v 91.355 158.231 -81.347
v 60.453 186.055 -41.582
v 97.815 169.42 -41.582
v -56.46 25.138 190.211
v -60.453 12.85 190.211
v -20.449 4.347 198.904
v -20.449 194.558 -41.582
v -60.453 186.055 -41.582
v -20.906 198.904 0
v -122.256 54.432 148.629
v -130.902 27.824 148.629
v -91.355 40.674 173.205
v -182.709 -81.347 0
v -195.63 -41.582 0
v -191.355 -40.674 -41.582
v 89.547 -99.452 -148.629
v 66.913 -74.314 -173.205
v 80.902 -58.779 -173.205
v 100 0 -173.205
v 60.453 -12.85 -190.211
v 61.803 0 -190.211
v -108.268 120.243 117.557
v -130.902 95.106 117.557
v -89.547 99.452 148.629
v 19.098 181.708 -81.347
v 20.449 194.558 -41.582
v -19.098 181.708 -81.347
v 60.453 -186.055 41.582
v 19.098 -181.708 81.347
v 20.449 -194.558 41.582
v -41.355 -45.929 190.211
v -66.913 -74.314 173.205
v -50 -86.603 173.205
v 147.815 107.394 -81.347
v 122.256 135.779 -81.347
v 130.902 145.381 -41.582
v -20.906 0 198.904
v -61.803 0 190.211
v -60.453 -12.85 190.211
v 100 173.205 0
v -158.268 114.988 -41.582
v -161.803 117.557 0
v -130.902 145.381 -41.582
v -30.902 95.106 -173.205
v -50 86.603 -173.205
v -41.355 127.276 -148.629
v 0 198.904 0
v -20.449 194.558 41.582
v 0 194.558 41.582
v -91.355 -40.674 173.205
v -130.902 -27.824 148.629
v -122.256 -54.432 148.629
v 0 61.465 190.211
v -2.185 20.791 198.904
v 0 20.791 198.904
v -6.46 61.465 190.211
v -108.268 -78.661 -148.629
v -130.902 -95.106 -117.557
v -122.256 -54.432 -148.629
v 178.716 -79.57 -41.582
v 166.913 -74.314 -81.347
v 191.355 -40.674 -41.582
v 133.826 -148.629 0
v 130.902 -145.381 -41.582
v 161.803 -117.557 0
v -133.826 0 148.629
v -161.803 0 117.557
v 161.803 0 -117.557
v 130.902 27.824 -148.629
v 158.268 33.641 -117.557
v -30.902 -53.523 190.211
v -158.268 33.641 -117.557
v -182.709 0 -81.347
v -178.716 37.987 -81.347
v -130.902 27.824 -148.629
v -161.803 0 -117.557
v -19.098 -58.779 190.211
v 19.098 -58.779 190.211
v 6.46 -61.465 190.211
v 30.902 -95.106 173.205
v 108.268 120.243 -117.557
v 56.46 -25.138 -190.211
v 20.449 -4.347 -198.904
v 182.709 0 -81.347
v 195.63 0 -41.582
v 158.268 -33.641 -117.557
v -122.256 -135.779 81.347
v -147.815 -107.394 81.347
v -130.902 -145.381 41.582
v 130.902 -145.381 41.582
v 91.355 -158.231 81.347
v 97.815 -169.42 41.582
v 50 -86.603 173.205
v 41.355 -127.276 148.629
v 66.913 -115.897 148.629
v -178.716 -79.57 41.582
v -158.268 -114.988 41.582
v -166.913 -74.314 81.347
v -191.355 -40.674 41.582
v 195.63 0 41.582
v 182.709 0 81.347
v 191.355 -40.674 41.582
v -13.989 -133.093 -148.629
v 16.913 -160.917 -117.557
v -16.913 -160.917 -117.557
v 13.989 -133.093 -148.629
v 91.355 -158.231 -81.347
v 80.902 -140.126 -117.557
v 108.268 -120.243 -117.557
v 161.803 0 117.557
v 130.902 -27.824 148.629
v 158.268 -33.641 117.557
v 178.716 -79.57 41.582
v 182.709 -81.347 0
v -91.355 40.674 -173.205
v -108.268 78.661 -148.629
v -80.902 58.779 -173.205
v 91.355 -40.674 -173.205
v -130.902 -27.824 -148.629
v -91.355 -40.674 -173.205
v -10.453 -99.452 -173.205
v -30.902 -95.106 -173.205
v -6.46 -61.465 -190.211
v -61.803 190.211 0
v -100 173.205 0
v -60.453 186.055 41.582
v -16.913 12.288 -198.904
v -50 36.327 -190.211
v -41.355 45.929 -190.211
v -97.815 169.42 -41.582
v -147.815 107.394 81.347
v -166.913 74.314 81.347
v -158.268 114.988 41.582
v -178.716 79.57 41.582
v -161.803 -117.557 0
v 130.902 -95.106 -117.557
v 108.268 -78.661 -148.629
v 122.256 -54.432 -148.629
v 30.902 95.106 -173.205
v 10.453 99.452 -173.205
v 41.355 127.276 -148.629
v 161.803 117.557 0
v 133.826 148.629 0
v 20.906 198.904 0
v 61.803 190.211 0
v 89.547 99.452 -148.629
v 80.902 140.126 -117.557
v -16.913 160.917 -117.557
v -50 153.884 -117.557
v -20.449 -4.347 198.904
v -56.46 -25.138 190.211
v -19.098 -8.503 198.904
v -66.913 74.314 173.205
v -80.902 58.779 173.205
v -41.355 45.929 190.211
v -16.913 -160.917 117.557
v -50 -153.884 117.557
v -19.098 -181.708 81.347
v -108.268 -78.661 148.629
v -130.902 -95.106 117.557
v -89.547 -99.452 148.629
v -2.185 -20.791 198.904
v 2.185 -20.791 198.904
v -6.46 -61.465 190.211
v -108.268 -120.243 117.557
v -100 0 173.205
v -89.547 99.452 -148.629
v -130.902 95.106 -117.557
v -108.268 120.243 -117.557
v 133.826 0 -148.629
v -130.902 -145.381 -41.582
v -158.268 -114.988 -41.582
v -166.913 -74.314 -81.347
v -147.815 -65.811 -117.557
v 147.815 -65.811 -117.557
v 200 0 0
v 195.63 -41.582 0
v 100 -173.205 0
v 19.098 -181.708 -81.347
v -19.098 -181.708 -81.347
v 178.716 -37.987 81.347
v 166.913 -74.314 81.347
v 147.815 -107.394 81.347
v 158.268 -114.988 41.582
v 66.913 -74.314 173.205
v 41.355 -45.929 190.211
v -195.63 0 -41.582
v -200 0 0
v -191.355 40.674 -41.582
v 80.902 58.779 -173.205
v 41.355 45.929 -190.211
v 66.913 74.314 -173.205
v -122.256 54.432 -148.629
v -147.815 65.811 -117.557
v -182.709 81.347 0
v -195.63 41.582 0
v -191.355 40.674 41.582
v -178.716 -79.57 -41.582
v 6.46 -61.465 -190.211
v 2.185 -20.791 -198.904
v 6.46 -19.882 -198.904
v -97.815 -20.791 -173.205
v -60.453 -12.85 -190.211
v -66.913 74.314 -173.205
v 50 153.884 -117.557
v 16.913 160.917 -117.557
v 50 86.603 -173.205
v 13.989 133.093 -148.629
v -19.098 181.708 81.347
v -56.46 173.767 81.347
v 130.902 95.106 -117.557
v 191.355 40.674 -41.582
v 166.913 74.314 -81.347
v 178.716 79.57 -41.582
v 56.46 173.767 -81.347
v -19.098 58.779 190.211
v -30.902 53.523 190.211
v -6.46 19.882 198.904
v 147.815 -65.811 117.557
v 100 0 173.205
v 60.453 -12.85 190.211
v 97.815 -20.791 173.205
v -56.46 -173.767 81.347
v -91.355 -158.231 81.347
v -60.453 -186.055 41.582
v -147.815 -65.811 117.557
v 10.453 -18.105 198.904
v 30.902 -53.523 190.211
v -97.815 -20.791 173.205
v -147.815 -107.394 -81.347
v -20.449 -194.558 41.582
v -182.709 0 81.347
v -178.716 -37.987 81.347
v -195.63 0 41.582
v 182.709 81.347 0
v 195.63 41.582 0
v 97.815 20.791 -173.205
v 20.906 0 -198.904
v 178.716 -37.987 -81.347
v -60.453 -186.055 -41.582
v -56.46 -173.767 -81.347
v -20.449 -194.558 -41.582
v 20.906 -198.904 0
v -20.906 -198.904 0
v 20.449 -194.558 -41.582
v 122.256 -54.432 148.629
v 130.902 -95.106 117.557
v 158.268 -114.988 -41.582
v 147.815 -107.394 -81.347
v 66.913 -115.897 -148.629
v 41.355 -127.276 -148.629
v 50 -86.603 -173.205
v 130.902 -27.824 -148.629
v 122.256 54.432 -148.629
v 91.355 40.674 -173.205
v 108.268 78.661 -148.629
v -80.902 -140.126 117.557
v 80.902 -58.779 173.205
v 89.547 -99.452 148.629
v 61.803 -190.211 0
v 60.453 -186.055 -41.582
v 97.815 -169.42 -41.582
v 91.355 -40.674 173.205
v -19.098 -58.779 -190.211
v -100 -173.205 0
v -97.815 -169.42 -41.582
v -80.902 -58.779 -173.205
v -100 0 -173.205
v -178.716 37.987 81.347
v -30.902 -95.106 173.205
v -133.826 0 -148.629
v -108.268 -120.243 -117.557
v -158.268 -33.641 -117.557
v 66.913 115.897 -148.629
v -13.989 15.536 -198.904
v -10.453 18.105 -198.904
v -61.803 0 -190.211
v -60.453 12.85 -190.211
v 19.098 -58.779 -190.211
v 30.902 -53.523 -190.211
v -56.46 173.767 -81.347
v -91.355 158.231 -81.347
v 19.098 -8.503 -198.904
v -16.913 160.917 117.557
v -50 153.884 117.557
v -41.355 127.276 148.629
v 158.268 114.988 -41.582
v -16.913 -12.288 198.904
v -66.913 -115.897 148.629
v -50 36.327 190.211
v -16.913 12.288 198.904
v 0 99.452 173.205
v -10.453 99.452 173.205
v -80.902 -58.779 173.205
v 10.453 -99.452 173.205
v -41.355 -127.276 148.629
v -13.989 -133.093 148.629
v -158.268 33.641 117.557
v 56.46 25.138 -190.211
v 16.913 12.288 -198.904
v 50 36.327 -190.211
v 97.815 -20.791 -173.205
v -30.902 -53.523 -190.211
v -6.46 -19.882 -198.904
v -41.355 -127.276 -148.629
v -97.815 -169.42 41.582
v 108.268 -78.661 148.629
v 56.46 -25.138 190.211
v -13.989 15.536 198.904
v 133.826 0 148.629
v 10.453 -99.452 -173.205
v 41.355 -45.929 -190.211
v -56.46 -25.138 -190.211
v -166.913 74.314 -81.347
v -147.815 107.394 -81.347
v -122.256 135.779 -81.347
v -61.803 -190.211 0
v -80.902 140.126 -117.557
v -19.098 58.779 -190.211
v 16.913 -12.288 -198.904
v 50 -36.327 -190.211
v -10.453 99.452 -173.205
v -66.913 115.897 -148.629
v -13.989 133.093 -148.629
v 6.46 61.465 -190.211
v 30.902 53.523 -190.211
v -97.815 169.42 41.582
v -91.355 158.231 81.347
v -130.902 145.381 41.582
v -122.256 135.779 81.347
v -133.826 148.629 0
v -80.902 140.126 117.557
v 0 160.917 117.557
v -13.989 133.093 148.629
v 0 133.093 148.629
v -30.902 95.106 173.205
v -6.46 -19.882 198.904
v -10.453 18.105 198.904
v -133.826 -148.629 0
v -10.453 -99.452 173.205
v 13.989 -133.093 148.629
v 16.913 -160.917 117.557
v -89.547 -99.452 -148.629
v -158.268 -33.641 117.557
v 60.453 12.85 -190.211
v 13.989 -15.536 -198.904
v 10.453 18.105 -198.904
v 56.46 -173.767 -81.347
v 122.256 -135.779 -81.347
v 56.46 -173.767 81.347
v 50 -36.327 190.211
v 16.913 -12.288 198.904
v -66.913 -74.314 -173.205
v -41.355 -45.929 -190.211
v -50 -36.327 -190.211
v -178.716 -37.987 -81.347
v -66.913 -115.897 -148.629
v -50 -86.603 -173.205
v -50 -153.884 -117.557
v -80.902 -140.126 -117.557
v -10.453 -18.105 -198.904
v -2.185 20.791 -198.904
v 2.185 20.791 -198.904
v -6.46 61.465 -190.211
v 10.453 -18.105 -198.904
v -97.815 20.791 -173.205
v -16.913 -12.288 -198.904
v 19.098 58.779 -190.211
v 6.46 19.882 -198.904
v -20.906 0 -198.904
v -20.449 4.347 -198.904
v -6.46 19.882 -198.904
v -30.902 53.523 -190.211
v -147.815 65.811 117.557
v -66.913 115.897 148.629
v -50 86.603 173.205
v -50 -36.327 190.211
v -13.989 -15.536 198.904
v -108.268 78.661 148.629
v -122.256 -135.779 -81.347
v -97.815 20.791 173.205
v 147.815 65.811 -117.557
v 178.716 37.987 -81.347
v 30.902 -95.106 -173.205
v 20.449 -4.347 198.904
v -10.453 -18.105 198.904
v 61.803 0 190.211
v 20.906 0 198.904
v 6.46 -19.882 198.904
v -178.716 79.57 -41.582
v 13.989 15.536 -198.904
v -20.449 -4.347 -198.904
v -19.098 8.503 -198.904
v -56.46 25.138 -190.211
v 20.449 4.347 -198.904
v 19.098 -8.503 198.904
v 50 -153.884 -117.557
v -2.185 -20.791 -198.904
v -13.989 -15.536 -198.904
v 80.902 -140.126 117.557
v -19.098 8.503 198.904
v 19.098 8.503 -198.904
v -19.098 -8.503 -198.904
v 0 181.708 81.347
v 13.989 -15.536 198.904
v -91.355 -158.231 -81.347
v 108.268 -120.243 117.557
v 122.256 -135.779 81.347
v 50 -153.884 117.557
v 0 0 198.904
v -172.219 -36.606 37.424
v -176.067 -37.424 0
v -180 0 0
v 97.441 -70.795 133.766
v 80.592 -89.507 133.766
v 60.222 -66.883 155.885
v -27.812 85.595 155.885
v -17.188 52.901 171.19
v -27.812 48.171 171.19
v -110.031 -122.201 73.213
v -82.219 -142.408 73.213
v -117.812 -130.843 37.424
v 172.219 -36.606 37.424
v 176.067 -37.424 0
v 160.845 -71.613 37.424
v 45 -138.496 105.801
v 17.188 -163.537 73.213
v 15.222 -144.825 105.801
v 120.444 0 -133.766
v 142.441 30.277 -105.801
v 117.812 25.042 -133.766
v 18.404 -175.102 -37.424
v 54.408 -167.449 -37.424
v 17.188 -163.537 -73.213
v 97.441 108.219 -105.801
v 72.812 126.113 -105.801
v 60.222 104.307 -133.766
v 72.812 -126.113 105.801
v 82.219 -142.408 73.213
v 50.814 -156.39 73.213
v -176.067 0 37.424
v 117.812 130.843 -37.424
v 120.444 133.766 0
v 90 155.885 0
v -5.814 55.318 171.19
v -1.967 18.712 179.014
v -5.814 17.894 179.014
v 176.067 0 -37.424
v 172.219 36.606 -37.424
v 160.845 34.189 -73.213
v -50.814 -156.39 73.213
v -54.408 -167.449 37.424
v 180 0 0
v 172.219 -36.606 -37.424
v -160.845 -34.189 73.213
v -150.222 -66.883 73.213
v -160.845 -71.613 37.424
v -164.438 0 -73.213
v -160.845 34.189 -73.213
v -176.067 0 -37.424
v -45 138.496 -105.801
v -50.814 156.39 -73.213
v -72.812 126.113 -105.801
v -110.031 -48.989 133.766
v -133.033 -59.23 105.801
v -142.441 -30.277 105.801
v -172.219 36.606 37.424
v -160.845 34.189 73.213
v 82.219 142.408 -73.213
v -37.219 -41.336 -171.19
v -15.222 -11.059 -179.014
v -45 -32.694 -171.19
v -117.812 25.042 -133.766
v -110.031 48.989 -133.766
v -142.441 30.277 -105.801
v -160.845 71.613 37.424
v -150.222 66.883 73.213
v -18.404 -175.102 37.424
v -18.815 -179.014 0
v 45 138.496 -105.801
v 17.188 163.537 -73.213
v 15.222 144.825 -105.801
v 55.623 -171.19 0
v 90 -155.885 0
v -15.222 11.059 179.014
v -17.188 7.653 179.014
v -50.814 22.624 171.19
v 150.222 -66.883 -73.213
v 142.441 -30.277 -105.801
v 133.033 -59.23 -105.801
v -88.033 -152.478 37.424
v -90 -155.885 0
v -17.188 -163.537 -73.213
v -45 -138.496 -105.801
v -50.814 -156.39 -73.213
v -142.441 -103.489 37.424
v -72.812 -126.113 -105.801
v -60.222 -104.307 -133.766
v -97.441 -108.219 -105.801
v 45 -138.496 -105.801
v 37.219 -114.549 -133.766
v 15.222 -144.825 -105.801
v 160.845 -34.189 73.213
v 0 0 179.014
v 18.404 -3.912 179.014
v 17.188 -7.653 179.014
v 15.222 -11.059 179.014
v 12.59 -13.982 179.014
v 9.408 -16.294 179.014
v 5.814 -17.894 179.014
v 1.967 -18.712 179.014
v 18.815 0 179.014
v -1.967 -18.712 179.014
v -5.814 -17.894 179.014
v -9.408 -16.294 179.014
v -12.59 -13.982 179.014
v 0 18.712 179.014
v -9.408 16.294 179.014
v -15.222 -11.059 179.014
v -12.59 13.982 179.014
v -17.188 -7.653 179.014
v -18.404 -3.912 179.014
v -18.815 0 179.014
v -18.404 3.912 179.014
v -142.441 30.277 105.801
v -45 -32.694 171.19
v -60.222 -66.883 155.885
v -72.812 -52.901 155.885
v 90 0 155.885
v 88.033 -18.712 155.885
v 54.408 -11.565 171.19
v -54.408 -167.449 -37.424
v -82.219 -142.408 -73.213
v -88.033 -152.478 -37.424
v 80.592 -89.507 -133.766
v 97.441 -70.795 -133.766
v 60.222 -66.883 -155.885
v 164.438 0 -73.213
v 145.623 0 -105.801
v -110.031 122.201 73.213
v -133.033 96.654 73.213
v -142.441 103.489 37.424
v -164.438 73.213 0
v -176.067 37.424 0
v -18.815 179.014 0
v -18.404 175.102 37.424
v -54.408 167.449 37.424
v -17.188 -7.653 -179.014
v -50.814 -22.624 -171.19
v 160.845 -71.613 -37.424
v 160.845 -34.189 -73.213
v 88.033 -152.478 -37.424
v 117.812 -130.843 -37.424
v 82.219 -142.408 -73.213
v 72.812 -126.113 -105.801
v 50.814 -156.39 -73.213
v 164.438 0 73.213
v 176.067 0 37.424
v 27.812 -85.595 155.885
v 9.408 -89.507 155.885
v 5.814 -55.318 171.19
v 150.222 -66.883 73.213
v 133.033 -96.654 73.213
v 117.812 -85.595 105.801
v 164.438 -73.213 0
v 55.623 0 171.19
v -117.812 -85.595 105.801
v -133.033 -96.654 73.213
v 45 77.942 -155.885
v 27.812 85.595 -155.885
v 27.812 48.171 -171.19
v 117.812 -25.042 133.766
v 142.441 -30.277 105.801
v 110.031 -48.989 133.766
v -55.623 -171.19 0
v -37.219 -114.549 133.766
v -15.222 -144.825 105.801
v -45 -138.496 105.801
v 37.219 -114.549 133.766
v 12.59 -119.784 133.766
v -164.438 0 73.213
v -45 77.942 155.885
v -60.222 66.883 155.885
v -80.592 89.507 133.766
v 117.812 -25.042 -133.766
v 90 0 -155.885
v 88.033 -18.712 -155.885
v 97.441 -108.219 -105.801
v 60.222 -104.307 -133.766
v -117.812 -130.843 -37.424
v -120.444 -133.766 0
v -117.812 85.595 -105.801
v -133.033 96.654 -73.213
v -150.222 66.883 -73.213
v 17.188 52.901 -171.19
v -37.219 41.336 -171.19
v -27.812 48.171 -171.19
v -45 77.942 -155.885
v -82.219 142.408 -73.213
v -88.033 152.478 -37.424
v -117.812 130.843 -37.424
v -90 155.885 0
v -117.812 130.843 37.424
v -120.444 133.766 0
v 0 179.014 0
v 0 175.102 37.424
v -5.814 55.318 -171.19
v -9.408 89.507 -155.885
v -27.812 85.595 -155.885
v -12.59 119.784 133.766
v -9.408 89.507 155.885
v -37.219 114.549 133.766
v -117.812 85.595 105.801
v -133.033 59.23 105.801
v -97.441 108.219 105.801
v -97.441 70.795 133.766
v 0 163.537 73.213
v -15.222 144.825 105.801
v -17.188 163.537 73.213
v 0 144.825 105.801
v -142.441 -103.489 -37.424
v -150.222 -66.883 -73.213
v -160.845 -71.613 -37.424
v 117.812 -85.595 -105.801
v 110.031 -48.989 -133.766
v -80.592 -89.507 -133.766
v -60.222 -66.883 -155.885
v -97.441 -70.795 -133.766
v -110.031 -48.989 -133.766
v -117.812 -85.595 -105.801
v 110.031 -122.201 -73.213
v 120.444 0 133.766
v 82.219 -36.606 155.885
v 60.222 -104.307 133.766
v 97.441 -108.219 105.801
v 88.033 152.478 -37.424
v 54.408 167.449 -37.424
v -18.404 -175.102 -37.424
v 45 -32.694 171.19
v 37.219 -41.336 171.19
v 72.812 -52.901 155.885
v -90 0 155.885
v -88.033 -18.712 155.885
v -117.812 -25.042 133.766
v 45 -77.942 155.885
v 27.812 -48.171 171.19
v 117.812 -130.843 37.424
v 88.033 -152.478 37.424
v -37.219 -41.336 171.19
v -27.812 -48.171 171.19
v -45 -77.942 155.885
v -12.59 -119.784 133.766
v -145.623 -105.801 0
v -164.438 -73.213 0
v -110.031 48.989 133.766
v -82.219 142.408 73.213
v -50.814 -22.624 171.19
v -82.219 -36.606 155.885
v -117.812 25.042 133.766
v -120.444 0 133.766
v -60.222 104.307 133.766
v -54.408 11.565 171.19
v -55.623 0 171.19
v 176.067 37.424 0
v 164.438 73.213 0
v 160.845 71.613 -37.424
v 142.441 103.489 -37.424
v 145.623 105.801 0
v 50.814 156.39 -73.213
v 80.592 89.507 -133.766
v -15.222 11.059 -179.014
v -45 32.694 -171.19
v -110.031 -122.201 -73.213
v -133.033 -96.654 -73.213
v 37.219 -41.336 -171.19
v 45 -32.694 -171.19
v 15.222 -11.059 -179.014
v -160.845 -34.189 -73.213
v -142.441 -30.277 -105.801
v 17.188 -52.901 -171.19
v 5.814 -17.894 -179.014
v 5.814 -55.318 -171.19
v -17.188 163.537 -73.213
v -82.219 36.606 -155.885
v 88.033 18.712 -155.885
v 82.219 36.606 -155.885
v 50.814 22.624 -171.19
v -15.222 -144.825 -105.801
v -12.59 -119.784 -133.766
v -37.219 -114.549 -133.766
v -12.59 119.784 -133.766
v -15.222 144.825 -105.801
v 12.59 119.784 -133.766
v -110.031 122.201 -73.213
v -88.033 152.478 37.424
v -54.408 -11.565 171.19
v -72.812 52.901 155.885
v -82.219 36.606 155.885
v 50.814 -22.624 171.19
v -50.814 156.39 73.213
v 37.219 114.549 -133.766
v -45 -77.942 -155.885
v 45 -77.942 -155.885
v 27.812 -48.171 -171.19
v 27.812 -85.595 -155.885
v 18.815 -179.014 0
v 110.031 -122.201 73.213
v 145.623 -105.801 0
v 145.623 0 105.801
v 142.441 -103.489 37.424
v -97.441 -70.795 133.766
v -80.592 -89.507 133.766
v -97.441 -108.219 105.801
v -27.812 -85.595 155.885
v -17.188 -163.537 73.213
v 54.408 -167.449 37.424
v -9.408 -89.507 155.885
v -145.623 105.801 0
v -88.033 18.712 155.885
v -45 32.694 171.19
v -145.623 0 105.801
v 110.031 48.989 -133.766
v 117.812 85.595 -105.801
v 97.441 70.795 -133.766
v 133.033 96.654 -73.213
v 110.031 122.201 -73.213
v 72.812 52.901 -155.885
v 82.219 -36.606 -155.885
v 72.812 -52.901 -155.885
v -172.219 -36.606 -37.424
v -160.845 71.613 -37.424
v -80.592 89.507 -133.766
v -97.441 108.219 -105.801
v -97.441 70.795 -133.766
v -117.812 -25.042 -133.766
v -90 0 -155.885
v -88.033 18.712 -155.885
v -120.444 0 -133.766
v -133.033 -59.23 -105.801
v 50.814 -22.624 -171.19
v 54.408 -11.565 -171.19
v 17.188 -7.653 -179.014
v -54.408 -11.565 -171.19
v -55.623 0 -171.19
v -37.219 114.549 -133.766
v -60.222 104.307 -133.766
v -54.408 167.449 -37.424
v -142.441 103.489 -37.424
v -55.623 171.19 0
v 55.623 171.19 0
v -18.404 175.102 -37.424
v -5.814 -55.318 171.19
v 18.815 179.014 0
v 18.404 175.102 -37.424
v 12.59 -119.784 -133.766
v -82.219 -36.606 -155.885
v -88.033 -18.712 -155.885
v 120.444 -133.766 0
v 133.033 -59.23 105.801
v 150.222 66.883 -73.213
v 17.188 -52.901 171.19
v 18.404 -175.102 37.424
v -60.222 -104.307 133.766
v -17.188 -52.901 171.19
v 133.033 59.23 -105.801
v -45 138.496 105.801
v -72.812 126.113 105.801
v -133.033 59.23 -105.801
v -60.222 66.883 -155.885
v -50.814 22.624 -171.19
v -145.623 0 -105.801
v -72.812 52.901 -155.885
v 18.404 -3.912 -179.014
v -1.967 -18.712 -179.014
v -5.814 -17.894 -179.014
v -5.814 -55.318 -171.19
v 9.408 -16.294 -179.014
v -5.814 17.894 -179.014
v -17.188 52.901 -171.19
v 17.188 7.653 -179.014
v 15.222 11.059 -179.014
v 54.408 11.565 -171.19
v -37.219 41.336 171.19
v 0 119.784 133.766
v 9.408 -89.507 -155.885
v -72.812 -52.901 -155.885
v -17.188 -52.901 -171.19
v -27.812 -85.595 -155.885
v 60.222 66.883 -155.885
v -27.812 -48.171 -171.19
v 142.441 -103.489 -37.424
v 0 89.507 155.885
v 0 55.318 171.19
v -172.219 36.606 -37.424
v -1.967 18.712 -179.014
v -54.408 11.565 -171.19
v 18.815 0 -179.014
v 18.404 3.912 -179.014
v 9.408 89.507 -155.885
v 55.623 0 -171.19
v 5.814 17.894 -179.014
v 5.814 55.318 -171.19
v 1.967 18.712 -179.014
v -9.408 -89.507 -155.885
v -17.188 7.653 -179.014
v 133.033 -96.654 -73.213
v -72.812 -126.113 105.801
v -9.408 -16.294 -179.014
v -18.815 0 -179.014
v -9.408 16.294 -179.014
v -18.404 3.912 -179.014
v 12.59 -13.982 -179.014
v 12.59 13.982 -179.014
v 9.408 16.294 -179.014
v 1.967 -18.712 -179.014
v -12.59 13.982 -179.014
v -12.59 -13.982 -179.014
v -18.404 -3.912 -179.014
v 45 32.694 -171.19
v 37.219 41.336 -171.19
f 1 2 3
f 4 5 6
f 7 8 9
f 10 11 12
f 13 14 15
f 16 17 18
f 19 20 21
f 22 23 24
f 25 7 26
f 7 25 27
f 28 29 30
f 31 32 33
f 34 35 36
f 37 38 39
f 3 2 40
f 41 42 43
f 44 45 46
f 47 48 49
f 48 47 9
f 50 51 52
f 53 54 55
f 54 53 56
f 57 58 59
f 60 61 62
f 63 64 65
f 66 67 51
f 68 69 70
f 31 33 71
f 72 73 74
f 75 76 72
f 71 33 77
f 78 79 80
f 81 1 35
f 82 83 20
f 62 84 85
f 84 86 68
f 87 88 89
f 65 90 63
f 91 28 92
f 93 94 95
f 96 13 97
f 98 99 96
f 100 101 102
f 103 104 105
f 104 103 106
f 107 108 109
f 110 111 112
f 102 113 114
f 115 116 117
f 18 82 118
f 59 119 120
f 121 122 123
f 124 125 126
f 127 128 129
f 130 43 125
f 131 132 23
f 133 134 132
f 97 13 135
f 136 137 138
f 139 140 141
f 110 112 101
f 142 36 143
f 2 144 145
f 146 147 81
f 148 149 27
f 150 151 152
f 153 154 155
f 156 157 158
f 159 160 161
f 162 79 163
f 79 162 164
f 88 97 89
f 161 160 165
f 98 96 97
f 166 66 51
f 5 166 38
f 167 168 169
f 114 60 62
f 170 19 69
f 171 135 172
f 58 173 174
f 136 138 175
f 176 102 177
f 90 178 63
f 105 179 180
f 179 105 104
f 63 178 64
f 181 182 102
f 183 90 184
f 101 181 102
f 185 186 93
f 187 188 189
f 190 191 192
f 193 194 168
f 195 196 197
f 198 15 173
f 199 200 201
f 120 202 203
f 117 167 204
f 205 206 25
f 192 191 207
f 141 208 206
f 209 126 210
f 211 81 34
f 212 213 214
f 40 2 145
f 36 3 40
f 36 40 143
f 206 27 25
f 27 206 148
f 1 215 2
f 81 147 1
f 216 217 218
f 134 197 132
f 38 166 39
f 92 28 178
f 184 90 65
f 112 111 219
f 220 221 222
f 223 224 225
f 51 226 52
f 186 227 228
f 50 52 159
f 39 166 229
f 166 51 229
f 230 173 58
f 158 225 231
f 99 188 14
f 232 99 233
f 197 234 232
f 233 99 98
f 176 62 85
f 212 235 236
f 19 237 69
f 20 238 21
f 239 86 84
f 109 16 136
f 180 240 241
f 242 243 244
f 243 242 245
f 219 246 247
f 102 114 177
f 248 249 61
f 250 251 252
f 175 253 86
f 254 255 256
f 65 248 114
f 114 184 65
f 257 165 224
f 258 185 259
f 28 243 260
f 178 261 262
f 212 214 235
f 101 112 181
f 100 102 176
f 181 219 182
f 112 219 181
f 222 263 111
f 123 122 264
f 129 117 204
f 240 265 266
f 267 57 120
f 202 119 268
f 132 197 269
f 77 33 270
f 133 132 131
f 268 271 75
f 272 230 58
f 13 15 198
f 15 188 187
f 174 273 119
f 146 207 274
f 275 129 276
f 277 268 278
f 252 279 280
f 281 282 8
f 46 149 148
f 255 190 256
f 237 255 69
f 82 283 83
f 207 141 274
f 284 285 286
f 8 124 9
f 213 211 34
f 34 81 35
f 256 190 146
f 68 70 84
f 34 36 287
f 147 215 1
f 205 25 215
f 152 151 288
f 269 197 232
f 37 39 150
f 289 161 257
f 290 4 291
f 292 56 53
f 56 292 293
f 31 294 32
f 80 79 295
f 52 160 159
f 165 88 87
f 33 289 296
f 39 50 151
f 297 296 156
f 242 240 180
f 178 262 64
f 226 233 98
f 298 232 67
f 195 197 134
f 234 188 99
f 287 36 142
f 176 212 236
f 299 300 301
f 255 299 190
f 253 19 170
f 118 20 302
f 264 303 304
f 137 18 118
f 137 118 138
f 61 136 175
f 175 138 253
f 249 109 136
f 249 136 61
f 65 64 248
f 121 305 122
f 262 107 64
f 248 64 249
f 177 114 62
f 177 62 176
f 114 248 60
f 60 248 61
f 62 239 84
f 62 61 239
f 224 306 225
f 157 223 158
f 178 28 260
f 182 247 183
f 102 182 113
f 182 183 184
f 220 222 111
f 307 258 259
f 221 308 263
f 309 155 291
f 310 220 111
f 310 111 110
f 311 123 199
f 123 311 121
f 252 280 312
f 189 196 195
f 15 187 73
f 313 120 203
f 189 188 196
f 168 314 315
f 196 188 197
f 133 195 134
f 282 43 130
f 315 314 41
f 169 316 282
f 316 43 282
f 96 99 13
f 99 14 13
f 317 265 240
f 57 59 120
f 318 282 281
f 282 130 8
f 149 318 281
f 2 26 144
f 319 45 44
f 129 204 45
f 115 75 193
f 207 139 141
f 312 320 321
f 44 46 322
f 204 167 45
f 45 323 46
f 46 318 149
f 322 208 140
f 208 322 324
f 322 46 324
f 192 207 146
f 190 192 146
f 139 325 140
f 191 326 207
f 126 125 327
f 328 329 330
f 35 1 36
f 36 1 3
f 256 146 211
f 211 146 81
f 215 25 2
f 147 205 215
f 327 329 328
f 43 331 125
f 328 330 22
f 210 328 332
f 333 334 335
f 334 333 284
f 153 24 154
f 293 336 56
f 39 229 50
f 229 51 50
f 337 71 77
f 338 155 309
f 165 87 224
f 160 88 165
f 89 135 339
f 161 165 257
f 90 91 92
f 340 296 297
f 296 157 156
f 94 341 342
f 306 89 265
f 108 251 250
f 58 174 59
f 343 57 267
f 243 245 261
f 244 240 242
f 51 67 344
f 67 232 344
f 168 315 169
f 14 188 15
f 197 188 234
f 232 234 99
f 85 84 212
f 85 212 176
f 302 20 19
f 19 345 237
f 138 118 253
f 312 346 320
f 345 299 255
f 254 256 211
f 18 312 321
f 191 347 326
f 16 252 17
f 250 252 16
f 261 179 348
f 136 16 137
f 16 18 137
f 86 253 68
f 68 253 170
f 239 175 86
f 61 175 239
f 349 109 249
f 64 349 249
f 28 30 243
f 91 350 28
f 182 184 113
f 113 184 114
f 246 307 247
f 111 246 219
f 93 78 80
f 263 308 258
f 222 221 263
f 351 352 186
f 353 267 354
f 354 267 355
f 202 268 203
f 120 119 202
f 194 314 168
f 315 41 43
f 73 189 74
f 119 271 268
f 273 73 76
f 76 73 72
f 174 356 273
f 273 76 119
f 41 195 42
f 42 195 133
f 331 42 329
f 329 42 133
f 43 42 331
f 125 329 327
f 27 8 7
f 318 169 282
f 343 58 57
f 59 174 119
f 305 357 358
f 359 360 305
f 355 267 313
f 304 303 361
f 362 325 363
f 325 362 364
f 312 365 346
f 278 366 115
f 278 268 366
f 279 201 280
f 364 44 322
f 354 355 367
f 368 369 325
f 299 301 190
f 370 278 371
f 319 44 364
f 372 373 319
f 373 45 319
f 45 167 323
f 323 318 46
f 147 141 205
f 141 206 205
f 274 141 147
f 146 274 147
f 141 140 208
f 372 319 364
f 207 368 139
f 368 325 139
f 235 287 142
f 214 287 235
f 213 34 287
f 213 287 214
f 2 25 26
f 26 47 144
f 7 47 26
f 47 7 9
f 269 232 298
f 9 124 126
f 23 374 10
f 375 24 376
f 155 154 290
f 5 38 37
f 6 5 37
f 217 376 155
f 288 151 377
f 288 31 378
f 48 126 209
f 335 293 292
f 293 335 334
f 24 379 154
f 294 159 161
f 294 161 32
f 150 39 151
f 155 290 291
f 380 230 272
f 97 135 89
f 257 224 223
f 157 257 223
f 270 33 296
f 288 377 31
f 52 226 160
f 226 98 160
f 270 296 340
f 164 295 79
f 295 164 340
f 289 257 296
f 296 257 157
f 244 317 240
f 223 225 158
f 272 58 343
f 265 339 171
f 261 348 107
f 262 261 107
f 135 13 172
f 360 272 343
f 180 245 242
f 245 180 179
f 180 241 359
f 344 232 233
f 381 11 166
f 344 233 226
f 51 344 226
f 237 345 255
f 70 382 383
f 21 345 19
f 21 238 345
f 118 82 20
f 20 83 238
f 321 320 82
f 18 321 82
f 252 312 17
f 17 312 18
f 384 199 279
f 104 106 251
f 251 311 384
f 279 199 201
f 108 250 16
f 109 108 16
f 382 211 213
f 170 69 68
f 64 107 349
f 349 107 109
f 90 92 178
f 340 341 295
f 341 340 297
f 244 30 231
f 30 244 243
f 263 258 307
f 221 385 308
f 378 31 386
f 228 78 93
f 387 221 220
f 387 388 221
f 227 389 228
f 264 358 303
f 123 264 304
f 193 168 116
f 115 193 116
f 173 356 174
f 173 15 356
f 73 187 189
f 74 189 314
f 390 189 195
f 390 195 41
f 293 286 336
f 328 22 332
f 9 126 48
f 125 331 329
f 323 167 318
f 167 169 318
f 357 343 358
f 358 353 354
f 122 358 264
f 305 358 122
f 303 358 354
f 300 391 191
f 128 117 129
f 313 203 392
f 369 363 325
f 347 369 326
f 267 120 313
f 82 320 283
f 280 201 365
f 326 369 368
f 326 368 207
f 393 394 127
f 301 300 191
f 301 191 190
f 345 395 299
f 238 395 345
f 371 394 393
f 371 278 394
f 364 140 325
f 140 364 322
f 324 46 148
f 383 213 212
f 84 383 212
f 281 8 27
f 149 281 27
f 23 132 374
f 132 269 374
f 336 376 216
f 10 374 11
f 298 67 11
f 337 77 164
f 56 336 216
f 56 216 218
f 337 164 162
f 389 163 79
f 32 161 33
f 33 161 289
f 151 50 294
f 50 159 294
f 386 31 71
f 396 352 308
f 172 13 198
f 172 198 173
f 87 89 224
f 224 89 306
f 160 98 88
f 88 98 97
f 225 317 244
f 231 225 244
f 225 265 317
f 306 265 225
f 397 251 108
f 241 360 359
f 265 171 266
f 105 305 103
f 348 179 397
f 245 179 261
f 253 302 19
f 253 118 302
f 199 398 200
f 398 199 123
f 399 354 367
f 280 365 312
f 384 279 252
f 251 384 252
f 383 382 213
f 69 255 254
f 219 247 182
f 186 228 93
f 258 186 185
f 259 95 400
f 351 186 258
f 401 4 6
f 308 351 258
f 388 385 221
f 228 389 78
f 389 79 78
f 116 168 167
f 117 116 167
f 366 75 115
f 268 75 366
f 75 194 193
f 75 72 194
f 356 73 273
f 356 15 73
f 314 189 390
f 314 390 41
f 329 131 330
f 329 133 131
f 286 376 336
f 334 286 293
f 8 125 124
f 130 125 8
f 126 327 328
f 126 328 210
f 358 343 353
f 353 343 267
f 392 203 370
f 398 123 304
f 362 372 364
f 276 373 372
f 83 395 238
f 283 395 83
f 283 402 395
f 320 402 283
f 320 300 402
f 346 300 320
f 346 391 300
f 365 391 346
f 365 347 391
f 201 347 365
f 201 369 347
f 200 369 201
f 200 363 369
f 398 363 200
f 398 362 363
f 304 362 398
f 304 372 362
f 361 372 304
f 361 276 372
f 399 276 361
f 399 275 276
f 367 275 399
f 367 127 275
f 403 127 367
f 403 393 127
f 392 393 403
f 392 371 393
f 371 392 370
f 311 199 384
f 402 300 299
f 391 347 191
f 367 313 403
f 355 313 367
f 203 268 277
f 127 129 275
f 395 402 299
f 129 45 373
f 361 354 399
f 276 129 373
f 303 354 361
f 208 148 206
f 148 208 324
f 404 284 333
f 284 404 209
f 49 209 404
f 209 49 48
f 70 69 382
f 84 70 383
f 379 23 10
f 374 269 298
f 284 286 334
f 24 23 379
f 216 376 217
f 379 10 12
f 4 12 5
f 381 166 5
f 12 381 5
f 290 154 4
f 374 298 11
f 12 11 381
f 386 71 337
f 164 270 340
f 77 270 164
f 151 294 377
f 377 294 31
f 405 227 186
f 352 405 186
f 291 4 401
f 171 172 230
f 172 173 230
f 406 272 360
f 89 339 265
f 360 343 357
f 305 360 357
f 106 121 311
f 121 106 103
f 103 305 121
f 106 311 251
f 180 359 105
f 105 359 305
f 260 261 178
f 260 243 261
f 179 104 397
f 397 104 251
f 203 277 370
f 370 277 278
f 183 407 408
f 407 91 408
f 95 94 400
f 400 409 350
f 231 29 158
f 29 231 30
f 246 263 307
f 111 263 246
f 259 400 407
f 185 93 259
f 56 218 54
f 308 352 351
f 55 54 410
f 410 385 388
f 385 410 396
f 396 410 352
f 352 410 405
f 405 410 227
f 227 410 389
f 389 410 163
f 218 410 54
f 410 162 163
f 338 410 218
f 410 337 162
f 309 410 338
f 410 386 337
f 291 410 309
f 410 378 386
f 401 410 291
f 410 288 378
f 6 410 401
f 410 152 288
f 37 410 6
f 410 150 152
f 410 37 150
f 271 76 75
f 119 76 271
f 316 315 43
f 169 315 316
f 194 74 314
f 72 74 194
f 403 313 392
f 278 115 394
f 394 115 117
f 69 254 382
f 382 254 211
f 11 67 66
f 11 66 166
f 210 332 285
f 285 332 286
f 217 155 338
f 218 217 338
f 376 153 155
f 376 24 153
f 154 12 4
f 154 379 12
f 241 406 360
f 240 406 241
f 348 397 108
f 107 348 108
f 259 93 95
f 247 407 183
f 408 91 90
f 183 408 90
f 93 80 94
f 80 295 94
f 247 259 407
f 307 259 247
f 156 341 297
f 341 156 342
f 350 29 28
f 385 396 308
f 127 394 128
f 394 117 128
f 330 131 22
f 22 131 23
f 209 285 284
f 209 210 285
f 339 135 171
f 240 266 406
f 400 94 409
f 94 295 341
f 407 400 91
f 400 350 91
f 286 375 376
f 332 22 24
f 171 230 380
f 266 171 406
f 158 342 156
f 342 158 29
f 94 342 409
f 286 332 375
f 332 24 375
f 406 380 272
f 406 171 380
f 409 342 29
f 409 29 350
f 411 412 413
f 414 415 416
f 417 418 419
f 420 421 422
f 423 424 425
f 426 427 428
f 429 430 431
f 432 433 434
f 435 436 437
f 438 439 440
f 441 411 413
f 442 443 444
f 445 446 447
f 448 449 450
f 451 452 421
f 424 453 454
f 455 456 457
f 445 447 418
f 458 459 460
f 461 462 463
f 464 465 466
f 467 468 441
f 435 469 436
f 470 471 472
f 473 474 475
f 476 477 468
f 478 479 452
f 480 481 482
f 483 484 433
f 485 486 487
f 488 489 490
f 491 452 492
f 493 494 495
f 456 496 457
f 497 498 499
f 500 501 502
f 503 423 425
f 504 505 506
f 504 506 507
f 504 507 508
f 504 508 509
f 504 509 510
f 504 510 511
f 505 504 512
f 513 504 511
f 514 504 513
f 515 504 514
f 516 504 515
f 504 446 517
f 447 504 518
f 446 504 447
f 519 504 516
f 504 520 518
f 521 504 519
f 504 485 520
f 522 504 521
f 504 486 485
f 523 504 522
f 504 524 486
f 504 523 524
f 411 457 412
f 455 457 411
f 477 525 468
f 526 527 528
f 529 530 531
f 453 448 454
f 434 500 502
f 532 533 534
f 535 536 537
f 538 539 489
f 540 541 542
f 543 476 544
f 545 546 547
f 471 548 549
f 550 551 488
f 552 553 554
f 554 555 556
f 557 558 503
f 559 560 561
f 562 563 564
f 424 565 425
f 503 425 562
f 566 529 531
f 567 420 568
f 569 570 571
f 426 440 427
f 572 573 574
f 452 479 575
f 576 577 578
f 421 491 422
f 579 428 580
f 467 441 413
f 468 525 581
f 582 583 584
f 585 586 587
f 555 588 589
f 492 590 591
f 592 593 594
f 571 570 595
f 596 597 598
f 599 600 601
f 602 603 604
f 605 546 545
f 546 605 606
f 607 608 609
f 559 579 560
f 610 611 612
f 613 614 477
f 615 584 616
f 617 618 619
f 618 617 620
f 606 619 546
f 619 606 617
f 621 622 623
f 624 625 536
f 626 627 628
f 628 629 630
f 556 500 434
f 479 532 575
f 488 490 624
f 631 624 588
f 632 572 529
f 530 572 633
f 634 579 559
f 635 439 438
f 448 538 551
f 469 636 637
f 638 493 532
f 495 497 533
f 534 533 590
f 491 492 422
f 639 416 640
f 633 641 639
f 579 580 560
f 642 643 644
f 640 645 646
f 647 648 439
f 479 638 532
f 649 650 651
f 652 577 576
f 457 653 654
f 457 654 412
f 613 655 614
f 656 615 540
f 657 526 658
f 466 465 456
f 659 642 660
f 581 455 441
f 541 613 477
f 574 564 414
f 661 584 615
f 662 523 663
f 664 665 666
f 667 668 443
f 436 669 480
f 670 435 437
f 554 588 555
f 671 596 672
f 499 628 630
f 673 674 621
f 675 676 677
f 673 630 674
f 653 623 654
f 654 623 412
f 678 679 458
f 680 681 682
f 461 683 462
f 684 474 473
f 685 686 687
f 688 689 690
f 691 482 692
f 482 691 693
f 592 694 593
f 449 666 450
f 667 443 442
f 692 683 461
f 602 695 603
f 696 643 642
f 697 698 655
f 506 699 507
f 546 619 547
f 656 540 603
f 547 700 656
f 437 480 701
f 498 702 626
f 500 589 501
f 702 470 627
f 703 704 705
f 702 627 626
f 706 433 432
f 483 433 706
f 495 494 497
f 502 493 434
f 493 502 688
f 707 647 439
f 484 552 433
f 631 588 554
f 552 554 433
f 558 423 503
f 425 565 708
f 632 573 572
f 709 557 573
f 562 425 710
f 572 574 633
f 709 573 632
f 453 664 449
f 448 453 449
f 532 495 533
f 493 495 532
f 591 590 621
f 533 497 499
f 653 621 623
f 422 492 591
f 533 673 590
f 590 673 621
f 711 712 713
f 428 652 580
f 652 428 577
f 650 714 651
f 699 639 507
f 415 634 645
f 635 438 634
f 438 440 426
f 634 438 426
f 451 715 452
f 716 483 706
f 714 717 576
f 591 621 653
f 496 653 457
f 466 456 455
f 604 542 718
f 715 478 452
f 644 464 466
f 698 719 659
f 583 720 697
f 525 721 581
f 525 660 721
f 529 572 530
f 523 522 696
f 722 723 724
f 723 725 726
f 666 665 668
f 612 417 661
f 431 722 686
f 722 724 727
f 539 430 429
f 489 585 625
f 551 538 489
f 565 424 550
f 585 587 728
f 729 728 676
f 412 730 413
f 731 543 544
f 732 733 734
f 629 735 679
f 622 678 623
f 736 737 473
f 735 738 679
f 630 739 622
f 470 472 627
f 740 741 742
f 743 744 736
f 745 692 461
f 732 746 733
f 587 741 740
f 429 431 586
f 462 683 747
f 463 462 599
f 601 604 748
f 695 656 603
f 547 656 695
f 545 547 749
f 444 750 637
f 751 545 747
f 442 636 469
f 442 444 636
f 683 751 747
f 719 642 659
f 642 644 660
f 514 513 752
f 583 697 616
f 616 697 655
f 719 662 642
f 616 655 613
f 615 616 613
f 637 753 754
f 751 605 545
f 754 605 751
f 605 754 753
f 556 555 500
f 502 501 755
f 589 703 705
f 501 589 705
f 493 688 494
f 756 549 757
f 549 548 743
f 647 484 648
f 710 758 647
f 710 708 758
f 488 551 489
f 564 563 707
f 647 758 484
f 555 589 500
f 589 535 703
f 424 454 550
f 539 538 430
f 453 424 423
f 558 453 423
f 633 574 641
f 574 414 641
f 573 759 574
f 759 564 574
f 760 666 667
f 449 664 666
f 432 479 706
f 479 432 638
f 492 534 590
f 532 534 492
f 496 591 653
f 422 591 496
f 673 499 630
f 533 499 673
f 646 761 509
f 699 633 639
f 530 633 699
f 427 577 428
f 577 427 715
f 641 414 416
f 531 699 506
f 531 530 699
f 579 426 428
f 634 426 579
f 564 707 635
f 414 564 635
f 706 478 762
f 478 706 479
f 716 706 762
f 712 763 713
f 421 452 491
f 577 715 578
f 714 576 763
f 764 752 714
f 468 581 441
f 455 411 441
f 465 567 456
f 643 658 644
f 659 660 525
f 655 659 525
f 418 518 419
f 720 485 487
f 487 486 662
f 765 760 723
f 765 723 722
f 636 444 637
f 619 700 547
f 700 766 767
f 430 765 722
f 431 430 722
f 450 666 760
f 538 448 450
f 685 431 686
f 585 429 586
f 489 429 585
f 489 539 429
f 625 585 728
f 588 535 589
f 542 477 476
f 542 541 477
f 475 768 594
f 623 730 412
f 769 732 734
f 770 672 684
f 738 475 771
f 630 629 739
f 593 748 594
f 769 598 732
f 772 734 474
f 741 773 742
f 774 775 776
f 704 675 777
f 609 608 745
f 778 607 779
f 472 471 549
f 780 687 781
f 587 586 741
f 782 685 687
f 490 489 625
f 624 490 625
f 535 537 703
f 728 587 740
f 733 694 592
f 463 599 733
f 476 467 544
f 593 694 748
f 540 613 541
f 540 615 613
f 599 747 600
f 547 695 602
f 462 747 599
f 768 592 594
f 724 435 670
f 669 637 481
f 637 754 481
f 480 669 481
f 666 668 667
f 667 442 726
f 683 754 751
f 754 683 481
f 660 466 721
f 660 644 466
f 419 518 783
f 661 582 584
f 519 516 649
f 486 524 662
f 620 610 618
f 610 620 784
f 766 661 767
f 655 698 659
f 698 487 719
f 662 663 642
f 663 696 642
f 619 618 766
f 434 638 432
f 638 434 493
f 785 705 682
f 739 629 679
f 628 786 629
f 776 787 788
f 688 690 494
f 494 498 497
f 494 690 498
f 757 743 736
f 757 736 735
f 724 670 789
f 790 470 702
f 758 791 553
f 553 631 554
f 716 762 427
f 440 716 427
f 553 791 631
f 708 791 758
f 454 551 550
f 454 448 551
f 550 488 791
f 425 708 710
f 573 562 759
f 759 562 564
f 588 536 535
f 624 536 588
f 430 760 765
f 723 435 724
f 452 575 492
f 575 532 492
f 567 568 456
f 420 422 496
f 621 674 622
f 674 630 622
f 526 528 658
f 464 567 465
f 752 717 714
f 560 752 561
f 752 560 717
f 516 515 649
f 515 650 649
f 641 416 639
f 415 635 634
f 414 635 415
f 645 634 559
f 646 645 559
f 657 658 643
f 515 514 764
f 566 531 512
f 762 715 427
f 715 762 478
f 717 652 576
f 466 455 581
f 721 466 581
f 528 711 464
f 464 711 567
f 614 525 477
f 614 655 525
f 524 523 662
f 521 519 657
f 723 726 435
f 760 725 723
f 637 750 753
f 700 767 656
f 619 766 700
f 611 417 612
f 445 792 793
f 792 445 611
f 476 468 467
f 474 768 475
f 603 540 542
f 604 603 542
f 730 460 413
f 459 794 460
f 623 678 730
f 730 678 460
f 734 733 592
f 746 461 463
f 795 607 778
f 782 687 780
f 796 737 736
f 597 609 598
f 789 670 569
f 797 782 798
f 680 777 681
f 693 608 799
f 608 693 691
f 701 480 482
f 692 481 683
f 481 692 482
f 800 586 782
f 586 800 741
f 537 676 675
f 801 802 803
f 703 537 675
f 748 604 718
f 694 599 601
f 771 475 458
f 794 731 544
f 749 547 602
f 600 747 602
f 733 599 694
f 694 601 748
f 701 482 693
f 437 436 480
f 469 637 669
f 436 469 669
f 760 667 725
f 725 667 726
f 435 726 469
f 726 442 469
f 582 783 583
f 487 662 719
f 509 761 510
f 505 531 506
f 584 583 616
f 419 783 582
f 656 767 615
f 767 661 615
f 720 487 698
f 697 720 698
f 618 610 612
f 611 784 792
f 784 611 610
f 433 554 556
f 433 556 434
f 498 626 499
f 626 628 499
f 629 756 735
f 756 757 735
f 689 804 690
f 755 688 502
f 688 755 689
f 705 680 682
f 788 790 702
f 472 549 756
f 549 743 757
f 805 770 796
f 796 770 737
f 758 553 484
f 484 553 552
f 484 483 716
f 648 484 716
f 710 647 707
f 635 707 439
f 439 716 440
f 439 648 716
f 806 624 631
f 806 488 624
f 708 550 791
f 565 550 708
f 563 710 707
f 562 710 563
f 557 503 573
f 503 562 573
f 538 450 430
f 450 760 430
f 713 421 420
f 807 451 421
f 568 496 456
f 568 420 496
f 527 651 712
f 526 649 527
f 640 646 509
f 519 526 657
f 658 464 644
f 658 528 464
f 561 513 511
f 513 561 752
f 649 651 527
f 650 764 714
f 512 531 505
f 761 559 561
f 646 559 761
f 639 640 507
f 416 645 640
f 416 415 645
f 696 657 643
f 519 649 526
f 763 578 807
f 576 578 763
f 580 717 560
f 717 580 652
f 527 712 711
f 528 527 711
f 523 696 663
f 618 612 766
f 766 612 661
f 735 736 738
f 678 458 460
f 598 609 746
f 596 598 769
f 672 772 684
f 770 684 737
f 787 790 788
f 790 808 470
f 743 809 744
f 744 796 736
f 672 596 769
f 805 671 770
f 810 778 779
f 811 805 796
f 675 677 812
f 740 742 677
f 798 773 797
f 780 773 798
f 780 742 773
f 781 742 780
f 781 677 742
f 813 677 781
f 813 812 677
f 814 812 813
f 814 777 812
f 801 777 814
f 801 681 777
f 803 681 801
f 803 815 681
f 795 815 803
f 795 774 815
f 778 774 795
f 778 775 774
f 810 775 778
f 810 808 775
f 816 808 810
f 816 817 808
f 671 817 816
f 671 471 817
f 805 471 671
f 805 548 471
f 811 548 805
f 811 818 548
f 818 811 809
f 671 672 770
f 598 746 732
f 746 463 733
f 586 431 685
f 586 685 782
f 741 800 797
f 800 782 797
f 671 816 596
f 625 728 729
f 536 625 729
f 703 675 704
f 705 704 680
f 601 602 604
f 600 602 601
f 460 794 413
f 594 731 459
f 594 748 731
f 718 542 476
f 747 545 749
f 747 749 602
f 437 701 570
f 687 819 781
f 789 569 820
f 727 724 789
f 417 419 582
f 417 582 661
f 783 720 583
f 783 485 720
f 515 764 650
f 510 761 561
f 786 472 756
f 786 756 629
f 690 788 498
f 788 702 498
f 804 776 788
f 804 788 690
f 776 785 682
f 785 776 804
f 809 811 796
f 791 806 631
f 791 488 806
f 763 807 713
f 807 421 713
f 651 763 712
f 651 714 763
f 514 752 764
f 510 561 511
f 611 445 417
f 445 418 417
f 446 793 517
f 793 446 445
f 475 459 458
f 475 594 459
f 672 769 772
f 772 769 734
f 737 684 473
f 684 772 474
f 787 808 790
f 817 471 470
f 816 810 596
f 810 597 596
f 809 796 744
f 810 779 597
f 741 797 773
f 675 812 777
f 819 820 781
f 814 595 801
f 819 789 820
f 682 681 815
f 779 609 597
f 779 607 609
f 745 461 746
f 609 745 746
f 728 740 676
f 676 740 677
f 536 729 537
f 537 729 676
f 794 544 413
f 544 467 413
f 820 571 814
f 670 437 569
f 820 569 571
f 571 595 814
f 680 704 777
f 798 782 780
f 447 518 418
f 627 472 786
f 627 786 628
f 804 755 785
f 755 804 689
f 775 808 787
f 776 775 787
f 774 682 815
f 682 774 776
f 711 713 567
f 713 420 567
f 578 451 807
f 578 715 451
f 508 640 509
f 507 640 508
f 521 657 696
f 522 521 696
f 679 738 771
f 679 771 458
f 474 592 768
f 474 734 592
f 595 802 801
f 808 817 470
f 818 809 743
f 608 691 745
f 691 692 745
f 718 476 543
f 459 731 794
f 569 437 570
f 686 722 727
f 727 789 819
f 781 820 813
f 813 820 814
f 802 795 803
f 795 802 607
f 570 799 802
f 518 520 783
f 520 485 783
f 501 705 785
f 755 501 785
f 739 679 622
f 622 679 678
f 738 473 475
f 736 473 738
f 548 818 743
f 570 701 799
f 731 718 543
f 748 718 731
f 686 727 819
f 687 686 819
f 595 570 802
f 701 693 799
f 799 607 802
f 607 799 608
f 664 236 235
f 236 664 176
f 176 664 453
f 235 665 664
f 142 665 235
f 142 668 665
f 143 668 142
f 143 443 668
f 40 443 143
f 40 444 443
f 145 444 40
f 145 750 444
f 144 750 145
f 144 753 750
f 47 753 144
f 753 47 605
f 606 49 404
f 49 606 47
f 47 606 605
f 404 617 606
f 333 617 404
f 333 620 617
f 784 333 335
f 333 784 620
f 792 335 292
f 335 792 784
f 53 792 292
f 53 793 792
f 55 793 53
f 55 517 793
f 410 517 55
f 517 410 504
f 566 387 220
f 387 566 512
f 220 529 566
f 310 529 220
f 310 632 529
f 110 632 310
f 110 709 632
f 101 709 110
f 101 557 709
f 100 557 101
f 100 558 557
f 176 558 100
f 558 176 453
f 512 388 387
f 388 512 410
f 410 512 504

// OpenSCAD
difference(){
sphere(200);
translate(0,0,20)sphere(180);
cube(200,200,200);
}
